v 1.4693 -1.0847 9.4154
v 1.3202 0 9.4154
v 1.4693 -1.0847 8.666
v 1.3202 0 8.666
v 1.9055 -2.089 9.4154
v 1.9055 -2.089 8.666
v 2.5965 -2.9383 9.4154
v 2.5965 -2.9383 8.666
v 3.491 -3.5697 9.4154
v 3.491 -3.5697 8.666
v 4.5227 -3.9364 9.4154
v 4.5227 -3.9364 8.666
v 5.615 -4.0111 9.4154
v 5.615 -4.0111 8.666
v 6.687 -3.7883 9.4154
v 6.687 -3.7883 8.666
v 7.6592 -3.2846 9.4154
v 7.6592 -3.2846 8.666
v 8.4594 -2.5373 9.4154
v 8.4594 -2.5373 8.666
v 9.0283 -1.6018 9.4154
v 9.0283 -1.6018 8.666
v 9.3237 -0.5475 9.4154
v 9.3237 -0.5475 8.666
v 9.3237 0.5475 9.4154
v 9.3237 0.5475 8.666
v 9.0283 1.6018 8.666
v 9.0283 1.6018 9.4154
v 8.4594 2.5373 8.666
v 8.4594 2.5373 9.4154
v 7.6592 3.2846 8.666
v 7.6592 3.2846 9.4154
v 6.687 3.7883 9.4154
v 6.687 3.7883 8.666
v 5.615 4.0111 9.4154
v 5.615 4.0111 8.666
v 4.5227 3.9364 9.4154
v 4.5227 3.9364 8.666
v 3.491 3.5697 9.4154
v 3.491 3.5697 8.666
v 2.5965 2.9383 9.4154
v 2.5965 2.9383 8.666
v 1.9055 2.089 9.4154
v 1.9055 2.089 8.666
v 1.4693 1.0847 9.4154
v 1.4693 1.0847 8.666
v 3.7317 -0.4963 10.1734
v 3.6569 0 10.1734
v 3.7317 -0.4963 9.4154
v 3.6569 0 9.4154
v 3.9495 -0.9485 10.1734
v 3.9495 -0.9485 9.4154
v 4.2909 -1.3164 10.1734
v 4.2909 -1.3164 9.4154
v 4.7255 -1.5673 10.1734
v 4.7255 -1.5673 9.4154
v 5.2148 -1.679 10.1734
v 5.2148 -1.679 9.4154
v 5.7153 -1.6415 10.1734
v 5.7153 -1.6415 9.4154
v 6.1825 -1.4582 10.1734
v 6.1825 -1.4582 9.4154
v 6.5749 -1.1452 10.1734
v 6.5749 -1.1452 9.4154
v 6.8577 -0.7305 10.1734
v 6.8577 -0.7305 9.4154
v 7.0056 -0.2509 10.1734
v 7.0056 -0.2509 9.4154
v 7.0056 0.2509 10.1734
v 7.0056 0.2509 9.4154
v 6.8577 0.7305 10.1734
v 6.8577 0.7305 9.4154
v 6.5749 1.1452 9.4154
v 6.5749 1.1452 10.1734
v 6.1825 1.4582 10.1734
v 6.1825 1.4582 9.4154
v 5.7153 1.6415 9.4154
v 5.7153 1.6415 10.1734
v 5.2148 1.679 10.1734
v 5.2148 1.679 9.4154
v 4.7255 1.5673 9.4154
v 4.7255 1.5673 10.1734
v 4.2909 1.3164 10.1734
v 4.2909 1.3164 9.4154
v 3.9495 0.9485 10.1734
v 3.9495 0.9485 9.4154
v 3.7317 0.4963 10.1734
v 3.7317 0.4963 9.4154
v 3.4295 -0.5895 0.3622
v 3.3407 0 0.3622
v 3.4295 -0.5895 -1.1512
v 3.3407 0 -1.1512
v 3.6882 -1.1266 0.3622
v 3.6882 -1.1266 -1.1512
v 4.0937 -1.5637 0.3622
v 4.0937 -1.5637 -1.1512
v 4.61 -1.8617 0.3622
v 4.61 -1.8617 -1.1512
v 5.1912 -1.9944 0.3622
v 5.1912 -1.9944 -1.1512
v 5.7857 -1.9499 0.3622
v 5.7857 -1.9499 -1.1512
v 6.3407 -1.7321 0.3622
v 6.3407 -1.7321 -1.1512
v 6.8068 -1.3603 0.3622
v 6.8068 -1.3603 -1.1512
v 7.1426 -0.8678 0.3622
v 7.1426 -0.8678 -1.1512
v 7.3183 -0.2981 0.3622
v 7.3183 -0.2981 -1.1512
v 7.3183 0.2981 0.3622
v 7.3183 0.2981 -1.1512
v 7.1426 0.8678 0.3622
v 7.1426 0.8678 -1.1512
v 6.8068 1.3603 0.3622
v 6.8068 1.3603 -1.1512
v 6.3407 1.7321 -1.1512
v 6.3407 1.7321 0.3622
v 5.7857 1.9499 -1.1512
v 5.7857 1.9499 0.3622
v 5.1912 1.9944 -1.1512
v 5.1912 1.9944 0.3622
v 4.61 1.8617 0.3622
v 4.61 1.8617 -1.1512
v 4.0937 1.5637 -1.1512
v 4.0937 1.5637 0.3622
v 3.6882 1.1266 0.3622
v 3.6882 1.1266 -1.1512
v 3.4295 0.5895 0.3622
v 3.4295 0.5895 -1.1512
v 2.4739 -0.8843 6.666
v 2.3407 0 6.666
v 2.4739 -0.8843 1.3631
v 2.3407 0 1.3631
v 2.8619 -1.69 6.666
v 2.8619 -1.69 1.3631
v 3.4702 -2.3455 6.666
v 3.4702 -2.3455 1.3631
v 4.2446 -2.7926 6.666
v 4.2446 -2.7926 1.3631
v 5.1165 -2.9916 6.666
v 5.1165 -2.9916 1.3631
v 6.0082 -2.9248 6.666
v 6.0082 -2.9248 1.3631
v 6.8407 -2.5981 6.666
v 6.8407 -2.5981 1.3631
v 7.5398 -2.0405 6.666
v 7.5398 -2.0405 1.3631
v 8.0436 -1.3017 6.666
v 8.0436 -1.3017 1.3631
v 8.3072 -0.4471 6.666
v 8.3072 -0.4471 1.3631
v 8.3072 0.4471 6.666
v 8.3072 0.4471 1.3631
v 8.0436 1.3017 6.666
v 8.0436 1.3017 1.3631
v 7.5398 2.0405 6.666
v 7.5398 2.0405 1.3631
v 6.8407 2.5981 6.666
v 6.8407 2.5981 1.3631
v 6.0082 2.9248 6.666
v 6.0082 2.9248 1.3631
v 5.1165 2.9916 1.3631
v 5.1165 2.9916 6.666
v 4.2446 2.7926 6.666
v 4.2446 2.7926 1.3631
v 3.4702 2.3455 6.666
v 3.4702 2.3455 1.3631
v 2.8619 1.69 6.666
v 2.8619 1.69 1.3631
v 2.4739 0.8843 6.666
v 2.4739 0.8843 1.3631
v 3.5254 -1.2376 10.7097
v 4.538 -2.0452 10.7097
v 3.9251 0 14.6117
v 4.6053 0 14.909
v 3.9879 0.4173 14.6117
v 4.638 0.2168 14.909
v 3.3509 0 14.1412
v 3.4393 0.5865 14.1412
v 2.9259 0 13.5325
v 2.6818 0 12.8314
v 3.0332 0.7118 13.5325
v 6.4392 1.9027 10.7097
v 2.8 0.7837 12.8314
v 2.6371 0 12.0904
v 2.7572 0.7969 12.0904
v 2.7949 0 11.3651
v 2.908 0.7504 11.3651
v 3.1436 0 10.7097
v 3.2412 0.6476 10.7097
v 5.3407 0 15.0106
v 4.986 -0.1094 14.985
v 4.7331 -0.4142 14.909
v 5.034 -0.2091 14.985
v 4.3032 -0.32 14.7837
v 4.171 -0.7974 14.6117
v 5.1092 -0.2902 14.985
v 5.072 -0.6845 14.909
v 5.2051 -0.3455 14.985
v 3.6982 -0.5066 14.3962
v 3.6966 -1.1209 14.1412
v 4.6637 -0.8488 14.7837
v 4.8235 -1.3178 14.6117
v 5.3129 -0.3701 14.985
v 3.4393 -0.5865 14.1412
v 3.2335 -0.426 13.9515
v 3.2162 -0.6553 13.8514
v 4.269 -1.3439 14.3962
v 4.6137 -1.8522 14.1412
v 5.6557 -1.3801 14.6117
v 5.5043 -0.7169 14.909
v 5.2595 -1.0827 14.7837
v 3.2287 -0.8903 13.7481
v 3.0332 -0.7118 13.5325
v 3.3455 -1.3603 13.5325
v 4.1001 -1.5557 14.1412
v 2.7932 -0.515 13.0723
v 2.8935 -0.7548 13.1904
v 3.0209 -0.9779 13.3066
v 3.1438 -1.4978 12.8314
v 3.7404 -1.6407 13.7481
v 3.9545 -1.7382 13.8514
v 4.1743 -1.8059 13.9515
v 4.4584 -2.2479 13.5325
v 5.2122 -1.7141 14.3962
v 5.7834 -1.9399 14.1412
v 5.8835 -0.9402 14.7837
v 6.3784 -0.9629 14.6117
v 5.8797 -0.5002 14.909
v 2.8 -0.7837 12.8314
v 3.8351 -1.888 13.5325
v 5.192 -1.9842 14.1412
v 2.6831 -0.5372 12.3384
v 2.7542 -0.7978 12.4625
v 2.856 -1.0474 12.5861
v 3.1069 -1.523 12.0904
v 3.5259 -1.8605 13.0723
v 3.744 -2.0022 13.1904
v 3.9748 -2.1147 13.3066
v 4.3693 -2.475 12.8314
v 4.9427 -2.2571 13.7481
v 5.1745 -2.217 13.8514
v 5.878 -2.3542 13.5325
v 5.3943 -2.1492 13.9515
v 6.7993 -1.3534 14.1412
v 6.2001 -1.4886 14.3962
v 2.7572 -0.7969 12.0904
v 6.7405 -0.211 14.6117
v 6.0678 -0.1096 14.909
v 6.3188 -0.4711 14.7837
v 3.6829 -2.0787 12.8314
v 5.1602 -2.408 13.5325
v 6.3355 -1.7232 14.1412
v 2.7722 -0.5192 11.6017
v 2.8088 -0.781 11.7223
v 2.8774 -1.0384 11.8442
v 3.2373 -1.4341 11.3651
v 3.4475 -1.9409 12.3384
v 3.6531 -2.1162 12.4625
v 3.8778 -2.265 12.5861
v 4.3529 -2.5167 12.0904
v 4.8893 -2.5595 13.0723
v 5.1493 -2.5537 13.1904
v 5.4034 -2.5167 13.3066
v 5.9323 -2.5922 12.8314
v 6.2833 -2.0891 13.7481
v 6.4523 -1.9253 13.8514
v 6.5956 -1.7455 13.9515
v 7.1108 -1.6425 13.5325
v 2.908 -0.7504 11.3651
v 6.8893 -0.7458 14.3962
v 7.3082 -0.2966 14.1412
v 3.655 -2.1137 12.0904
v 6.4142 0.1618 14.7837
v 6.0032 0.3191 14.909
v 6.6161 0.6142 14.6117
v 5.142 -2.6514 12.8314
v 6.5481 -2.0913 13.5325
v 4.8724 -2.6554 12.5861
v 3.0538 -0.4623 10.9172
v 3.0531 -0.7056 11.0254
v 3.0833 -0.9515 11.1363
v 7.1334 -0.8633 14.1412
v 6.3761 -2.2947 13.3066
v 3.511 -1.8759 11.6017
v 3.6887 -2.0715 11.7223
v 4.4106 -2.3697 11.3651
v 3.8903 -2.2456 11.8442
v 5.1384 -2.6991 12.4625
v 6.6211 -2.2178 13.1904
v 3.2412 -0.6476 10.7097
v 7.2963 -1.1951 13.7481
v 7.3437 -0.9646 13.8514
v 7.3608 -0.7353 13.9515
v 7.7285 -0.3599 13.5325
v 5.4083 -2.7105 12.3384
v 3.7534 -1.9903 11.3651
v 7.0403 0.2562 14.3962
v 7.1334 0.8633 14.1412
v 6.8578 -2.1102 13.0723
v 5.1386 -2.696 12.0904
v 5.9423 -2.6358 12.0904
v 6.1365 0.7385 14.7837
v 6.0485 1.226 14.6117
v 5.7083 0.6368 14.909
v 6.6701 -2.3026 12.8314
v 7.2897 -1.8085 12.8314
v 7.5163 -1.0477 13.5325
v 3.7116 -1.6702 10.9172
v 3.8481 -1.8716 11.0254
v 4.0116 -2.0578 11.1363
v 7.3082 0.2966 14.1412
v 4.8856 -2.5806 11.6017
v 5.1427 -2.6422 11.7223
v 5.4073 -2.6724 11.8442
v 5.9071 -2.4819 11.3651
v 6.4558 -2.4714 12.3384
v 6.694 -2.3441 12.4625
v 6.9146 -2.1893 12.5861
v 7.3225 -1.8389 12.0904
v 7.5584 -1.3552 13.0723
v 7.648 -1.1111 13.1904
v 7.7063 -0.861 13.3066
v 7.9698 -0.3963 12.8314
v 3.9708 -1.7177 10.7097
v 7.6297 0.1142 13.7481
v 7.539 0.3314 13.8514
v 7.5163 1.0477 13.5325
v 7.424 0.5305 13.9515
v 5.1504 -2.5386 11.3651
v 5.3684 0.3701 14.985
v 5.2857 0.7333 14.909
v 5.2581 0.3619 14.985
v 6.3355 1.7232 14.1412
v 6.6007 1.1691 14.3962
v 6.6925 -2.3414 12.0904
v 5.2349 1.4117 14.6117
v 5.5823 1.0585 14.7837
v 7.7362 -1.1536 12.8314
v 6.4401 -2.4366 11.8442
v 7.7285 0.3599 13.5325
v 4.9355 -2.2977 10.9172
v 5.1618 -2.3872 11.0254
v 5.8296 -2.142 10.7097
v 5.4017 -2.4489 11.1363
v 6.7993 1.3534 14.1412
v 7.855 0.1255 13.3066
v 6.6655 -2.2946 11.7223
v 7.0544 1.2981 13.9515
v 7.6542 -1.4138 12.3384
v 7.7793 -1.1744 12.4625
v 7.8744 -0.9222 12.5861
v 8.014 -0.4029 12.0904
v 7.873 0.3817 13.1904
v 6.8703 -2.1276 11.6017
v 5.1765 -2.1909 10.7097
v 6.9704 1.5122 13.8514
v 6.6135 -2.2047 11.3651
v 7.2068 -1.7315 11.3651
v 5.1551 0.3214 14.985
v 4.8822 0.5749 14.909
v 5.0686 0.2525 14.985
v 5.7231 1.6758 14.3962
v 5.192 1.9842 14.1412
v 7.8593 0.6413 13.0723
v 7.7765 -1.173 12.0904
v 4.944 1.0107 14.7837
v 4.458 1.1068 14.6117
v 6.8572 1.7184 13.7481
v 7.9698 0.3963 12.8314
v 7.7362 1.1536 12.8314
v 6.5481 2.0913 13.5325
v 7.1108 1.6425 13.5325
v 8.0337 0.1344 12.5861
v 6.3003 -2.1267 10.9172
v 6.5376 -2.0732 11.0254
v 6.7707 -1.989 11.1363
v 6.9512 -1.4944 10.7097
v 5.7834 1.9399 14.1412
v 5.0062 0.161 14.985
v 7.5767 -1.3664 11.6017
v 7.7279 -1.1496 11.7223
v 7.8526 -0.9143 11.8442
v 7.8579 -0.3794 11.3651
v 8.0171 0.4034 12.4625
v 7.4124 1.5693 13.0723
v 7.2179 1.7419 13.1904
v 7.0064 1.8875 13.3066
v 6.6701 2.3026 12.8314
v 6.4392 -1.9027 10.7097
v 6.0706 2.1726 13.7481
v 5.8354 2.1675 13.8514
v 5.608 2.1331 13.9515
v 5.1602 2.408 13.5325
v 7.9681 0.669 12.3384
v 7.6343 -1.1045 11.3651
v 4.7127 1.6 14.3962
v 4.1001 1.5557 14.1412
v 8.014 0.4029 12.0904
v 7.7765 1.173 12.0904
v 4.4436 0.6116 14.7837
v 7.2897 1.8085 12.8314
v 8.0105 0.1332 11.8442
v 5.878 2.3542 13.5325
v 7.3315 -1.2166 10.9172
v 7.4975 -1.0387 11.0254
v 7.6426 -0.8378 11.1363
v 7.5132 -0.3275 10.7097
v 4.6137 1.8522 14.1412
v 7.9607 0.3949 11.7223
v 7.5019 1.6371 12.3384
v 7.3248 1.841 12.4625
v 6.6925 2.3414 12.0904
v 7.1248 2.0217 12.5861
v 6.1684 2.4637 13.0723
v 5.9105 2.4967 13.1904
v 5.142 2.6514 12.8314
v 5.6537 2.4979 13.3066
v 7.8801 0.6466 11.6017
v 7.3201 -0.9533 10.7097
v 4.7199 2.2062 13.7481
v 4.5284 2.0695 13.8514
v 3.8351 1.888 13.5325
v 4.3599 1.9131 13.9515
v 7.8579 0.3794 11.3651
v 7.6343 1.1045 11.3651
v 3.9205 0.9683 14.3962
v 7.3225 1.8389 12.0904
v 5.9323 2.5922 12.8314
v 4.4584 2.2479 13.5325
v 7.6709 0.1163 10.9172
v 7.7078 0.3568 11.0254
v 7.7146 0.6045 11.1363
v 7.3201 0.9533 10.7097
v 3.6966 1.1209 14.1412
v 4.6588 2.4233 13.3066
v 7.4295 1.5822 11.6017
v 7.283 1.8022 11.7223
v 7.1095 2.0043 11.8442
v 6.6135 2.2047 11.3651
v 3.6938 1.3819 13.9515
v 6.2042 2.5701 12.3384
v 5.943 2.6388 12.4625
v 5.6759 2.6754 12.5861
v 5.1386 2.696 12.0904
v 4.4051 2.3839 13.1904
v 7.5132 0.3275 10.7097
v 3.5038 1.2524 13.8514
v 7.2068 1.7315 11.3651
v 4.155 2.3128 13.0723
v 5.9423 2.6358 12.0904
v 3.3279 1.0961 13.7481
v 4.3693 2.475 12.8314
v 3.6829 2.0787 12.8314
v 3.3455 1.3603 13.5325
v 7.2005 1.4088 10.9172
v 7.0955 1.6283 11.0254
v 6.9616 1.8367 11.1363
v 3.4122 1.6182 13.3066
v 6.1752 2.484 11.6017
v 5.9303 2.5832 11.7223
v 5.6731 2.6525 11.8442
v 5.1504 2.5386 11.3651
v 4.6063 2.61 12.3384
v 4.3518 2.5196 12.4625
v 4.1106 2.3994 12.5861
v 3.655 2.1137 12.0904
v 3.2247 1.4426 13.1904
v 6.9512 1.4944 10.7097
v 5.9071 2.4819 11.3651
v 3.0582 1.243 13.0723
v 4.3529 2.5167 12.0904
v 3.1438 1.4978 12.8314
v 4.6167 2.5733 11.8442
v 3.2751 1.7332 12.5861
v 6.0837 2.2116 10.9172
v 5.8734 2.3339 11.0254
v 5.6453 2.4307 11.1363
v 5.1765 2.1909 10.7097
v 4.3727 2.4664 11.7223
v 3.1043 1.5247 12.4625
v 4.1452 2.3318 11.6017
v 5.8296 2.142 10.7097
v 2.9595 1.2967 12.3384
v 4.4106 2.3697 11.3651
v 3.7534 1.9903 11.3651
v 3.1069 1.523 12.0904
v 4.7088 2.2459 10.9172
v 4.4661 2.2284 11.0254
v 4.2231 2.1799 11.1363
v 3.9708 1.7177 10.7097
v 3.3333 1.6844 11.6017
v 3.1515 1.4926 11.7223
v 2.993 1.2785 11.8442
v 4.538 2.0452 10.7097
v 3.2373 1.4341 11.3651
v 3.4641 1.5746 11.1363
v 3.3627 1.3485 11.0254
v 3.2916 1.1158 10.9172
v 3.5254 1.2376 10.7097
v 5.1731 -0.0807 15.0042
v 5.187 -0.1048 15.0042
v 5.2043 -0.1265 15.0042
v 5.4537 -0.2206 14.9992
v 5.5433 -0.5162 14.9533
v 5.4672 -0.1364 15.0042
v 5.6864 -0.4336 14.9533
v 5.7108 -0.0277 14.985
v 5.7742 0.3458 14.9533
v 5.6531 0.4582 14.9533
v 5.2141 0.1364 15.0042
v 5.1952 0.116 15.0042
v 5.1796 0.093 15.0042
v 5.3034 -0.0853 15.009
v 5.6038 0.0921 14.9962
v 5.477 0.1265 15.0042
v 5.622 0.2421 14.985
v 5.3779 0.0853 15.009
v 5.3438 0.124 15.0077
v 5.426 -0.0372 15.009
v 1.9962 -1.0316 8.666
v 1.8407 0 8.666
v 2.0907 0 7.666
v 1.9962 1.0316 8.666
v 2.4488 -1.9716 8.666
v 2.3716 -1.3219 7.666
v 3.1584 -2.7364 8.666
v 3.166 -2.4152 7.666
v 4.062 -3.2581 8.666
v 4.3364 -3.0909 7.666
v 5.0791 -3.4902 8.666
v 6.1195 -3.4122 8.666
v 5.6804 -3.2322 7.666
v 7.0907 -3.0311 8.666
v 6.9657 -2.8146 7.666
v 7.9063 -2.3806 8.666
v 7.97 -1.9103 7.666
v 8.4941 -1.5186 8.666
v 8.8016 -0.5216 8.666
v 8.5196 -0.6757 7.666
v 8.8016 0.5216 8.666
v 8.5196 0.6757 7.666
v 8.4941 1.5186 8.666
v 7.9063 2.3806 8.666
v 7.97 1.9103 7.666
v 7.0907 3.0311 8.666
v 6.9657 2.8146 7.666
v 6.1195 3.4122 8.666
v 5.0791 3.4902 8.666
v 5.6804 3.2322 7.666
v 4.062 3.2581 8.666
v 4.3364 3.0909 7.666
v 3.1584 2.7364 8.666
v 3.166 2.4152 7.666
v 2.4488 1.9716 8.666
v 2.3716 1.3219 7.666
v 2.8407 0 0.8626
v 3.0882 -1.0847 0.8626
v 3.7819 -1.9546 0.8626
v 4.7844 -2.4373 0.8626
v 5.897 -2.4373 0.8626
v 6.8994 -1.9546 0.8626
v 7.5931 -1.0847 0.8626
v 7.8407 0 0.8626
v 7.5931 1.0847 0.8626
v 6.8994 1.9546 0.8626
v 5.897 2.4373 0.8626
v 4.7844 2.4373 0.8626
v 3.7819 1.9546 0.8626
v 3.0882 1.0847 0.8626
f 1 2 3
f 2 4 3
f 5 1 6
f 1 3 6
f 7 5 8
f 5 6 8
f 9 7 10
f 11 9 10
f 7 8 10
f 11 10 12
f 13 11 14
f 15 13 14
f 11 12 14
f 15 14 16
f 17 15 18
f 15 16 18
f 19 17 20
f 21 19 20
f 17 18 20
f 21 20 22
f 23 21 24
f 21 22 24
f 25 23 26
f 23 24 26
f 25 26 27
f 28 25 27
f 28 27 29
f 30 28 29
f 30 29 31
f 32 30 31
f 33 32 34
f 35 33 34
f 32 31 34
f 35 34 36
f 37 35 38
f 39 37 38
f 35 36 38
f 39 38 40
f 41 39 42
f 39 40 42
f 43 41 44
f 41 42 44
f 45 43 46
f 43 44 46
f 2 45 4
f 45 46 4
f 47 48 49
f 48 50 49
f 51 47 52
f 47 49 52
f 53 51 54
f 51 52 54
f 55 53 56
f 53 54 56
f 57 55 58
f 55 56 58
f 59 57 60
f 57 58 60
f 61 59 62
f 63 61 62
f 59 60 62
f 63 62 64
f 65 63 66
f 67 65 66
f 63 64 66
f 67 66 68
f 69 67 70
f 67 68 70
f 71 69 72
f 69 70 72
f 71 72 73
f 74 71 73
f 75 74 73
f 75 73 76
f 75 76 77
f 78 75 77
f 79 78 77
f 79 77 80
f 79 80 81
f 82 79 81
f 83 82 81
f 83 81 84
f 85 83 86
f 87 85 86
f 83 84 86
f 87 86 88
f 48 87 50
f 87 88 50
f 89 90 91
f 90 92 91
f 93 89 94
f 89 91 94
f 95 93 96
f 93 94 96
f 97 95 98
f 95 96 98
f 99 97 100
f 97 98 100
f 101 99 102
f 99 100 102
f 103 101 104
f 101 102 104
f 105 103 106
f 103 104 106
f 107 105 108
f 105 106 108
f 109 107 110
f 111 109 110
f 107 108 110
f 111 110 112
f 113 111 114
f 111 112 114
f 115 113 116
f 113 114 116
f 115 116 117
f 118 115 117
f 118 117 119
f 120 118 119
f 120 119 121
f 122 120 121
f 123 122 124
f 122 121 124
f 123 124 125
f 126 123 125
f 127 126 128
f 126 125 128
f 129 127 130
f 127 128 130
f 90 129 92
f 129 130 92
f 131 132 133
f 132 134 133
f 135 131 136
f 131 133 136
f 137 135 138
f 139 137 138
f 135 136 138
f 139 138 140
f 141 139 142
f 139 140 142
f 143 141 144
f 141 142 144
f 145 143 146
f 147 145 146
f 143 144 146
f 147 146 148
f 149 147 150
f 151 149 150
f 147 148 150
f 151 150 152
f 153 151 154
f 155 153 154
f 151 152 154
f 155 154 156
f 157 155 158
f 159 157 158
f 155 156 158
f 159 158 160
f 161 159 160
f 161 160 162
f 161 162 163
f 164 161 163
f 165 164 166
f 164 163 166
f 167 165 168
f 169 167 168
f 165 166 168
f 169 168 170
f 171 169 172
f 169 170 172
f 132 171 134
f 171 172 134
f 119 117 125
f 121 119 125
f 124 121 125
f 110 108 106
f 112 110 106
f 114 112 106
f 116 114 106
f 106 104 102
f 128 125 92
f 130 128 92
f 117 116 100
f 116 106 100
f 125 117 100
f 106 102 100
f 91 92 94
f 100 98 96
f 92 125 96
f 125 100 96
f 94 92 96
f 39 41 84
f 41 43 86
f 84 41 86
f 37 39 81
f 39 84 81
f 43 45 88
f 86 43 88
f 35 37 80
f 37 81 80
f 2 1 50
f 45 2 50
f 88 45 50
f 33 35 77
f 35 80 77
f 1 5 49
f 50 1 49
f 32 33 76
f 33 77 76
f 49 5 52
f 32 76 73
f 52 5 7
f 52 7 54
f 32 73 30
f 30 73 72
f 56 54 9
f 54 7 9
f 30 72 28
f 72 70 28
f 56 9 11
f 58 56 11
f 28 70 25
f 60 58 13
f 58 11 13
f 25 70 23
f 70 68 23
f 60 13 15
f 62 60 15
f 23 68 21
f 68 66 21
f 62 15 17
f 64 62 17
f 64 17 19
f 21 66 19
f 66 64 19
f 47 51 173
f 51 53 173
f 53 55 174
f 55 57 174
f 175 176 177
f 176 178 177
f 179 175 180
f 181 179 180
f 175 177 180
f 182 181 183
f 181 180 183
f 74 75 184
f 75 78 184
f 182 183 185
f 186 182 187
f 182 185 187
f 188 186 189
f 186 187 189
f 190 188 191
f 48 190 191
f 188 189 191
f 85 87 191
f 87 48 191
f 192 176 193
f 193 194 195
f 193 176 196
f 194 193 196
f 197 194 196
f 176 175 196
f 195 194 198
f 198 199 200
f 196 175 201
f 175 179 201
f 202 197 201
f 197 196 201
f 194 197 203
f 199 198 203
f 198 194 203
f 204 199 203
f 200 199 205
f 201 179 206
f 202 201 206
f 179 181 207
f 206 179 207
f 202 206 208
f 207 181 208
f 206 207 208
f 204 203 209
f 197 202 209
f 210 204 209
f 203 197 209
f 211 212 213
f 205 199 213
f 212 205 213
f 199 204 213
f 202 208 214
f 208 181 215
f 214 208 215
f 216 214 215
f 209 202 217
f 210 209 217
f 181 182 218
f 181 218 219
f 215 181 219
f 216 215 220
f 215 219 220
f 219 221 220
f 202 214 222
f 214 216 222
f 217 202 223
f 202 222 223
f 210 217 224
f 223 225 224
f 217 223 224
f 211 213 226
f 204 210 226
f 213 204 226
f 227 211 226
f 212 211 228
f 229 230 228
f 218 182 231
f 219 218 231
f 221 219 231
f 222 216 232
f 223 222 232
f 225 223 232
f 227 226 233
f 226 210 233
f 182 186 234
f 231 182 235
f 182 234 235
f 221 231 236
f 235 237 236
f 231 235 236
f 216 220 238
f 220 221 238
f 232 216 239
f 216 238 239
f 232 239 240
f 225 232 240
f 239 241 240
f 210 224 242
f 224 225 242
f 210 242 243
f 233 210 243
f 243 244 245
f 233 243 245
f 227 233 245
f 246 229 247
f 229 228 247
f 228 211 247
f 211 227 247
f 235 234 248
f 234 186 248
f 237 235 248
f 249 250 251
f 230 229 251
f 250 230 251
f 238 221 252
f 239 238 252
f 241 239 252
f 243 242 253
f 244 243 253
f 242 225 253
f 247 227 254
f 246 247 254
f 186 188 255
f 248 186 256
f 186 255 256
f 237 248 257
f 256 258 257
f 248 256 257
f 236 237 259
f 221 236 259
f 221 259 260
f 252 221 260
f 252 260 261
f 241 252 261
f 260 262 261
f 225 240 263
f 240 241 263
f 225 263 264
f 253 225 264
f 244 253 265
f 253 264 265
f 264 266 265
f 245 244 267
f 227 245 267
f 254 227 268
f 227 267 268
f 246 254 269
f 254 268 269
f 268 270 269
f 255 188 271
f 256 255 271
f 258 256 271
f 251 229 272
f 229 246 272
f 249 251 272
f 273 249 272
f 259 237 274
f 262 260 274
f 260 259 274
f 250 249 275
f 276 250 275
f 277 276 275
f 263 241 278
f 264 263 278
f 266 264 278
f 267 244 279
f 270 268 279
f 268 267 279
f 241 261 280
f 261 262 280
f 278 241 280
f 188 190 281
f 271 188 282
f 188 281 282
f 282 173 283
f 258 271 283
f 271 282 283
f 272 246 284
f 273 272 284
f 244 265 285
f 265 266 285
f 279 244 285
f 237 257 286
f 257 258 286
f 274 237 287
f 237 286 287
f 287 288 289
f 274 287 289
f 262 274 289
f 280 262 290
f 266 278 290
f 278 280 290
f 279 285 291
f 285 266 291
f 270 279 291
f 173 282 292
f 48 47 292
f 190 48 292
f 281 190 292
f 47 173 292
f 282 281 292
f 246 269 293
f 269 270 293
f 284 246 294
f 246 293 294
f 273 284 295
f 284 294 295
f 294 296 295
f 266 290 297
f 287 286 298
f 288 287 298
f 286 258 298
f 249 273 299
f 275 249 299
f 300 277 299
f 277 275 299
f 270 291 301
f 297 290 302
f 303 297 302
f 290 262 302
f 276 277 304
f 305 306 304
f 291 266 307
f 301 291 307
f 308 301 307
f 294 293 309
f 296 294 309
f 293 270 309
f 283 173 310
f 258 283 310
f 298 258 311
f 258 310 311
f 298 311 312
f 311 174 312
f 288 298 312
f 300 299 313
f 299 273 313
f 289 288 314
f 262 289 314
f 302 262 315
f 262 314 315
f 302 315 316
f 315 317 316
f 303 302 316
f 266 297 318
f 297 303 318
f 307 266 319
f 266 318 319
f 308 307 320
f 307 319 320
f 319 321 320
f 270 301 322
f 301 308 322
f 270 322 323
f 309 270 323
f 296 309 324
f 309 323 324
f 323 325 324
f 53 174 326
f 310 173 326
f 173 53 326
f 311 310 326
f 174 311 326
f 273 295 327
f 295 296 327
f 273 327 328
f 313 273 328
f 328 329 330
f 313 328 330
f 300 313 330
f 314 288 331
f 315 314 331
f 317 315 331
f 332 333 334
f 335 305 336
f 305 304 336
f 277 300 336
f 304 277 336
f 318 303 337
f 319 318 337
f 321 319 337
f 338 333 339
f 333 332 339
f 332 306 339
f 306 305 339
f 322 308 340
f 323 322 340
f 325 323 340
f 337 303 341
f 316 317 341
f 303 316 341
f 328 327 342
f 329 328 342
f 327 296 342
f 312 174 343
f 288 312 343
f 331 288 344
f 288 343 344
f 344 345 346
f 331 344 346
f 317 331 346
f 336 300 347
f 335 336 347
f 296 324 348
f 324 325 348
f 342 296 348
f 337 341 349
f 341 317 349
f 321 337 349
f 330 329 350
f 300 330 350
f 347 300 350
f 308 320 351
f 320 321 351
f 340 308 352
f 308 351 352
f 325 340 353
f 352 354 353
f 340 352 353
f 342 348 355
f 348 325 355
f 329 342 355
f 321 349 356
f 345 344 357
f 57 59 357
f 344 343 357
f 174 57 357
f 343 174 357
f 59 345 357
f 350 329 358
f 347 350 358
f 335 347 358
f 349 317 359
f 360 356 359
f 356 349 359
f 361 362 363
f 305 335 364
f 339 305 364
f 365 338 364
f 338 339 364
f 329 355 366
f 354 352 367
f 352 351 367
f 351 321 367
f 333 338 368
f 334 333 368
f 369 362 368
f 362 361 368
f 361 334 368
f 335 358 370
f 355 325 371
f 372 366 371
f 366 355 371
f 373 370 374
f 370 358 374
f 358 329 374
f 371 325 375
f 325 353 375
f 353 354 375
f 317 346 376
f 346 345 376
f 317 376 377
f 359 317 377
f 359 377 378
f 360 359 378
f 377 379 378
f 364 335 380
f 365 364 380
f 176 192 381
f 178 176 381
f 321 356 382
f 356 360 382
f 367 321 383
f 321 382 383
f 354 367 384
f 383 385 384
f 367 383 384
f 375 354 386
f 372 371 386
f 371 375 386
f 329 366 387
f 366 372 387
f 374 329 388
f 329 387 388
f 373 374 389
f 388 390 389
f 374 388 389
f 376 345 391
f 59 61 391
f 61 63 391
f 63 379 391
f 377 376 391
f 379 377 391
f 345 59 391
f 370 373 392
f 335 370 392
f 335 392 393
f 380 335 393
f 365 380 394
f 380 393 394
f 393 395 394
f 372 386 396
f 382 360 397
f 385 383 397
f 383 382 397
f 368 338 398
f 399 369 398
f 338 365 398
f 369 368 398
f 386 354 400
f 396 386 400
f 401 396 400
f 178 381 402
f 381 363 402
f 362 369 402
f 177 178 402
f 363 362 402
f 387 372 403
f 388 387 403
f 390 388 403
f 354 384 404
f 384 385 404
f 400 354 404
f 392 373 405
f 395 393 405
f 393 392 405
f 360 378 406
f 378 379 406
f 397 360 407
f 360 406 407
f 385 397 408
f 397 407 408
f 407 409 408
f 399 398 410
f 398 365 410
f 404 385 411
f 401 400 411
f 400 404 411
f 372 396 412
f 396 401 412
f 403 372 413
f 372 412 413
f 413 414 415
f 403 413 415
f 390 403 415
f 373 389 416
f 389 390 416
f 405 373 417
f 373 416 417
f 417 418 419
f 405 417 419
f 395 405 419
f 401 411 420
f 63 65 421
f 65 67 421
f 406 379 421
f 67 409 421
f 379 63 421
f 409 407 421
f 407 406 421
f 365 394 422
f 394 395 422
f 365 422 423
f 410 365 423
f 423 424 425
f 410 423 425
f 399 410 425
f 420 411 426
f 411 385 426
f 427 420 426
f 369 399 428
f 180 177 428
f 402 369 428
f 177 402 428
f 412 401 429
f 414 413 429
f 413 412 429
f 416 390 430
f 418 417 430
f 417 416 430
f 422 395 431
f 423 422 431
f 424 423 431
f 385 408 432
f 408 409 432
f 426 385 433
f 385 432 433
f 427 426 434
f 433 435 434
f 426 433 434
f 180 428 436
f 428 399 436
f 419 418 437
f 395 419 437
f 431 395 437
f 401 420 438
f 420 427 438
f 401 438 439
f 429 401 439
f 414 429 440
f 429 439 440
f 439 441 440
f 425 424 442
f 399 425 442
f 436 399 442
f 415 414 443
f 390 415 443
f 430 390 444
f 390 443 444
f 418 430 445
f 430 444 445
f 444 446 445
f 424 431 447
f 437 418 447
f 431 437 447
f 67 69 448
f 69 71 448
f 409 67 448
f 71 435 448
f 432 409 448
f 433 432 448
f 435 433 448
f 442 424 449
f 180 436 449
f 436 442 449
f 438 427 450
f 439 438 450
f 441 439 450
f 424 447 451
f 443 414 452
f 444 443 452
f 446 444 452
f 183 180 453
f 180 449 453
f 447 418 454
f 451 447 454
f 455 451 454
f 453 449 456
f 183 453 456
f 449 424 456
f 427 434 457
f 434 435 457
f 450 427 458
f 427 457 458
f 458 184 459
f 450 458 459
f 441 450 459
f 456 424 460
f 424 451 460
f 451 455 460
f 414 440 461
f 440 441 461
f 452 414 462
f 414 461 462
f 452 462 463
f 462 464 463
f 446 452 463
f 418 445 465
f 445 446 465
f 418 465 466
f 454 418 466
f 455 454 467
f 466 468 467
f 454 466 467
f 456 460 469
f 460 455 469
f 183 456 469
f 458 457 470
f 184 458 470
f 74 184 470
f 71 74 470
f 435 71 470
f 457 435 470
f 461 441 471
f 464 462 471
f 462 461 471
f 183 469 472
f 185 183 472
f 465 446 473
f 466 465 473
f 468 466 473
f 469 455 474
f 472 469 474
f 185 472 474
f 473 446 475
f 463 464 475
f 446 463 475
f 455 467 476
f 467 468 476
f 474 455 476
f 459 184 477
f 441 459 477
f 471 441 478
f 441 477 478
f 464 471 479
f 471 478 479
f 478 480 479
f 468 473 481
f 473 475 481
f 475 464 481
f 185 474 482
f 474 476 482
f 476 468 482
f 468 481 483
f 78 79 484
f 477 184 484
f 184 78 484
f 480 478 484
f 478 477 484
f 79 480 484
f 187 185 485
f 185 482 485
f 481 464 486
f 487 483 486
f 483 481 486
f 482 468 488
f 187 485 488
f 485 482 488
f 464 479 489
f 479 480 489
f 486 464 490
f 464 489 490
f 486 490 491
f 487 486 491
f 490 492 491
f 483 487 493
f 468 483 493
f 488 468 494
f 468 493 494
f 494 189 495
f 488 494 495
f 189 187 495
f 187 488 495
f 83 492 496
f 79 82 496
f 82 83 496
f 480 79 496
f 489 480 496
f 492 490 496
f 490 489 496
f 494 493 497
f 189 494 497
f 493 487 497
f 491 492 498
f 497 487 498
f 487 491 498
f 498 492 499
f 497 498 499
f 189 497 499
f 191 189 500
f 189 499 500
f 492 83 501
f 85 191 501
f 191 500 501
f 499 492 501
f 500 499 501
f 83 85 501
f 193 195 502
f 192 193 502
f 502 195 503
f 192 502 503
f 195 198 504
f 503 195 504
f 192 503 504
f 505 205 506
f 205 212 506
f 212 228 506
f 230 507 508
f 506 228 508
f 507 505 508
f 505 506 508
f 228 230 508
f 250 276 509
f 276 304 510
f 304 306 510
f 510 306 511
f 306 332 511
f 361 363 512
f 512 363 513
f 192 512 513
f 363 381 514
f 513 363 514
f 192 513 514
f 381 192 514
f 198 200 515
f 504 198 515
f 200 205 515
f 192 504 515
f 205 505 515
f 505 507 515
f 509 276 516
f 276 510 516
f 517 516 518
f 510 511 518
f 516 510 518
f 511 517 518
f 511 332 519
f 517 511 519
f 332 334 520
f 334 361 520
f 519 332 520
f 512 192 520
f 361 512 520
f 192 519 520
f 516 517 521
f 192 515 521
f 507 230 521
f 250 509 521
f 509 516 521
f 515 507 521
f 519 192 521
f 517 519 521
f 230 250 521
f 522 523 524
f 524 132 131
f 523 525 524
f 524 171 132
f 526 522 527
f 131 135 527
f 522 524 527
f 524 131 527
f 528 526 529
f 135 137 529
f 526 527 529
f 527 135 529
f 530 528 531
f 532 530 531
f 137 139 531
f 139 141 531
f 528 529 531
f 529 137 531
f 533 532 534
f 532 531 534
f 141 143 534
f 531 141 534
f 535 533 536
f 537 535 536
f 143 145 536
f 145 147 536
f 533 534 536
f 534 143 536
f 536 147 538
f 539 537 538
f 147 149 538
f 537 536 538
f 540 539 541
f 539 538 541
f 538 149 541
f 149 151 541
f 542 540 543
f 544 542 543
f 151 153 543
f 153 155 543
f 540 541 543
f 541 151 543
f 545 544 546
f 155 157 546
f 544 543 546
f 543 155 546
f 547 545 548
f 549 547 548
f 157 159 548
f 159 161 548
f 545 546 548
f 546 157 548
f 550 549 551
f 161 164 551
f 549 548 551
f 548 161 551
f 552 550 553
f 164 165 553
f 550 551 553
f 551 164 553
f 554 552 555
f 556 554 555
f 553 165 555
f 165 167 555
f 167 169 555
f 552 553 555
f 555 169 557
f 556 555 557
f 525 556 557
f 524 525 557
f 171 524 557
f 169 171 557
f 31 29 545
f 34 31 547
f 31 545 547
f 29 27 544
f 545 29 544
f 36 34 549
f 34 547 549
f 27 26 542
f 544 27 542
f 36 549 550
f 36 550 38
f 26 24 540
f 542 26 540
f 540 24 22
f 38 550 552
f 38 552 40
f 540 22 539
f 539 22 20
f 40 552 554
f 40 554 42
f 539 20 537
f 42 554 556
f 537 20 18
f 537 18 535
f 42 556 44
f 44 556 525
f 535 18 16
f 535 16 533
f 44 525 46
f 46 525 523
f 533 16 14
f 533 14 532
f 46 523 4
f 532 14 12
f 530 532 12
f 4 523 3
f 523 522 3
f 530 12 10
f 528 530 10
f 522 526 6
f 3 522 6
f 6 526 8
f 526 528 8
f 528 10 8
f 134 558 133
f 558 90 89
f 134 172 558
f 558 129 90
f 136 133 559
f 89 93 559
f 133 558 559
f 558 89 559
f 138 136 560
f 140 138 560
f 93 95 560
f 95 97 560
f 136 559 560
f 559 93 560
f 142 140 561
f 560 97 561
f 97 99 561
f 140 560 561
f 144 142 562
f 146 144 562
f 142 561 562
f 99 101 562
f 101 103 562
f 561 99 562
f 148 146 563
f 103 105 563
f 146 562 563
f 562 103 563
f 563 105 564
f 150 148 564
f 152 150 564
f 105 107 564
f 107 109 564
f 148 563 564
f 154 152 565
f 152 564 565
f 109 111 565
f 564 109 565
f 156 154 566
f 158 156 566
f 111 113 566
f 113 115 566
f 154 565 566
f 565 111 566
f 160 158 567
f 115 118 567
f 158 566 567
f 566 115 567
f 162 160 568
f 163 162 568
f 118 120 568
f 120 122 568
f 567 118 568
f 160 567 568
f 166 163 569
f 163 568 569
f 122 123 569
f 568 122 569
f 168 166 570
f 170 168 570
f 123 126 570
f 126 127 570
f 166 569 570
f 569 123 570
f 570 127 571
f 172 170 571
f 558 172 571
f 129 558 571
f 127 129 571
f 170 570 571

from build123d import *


with BuildPart() as f1:
    # F0 (on Front) → F1 (revolve)
    with BuildSketch(Plane.XZ):
        with BuildLine():
            Line((1.320192, 9.415357), (1.320192, 8.666018))
            Line((1.320192, 8.666018), (1.840662, 8.666018))
            Line((1.840662, 8.666018), (2.340662, 6.666018))
            Line((2.340662, 6.666018), (2.340662, 1.363074))
            Line((2.340662, 1.363074), (3.340662, 0.362162))
            Line((3.340662, 0.362162), (3.340662, -1.151177))
            Line((3.340662, -1.151177), (5.340662, -1.151177))
            Line((5.340662, -1.151177), (5.340662, 9.415357))
            Line((5.340662, 9.415357), (5.340662, 10.261006))
            Line((5.340662, 10.261006), (5.340662, 13.182231))
            Line((5.340662, 13.182231), (5.340662, 15.010567))
            ThreePointArc((5.340662, 15.010567), (2.779756, 13.190362), (3.656931, 10.173419))
            Line((3.656931, 10.173419), (3.656931, 9.415357))
            Line((3.656931, 9.415357), (1.320192, 9.415357))
        make_face()
    revolve(axis=Axis((5.340662, 0, 4.13209), (0, 0, 1)))


solid = f1.part
